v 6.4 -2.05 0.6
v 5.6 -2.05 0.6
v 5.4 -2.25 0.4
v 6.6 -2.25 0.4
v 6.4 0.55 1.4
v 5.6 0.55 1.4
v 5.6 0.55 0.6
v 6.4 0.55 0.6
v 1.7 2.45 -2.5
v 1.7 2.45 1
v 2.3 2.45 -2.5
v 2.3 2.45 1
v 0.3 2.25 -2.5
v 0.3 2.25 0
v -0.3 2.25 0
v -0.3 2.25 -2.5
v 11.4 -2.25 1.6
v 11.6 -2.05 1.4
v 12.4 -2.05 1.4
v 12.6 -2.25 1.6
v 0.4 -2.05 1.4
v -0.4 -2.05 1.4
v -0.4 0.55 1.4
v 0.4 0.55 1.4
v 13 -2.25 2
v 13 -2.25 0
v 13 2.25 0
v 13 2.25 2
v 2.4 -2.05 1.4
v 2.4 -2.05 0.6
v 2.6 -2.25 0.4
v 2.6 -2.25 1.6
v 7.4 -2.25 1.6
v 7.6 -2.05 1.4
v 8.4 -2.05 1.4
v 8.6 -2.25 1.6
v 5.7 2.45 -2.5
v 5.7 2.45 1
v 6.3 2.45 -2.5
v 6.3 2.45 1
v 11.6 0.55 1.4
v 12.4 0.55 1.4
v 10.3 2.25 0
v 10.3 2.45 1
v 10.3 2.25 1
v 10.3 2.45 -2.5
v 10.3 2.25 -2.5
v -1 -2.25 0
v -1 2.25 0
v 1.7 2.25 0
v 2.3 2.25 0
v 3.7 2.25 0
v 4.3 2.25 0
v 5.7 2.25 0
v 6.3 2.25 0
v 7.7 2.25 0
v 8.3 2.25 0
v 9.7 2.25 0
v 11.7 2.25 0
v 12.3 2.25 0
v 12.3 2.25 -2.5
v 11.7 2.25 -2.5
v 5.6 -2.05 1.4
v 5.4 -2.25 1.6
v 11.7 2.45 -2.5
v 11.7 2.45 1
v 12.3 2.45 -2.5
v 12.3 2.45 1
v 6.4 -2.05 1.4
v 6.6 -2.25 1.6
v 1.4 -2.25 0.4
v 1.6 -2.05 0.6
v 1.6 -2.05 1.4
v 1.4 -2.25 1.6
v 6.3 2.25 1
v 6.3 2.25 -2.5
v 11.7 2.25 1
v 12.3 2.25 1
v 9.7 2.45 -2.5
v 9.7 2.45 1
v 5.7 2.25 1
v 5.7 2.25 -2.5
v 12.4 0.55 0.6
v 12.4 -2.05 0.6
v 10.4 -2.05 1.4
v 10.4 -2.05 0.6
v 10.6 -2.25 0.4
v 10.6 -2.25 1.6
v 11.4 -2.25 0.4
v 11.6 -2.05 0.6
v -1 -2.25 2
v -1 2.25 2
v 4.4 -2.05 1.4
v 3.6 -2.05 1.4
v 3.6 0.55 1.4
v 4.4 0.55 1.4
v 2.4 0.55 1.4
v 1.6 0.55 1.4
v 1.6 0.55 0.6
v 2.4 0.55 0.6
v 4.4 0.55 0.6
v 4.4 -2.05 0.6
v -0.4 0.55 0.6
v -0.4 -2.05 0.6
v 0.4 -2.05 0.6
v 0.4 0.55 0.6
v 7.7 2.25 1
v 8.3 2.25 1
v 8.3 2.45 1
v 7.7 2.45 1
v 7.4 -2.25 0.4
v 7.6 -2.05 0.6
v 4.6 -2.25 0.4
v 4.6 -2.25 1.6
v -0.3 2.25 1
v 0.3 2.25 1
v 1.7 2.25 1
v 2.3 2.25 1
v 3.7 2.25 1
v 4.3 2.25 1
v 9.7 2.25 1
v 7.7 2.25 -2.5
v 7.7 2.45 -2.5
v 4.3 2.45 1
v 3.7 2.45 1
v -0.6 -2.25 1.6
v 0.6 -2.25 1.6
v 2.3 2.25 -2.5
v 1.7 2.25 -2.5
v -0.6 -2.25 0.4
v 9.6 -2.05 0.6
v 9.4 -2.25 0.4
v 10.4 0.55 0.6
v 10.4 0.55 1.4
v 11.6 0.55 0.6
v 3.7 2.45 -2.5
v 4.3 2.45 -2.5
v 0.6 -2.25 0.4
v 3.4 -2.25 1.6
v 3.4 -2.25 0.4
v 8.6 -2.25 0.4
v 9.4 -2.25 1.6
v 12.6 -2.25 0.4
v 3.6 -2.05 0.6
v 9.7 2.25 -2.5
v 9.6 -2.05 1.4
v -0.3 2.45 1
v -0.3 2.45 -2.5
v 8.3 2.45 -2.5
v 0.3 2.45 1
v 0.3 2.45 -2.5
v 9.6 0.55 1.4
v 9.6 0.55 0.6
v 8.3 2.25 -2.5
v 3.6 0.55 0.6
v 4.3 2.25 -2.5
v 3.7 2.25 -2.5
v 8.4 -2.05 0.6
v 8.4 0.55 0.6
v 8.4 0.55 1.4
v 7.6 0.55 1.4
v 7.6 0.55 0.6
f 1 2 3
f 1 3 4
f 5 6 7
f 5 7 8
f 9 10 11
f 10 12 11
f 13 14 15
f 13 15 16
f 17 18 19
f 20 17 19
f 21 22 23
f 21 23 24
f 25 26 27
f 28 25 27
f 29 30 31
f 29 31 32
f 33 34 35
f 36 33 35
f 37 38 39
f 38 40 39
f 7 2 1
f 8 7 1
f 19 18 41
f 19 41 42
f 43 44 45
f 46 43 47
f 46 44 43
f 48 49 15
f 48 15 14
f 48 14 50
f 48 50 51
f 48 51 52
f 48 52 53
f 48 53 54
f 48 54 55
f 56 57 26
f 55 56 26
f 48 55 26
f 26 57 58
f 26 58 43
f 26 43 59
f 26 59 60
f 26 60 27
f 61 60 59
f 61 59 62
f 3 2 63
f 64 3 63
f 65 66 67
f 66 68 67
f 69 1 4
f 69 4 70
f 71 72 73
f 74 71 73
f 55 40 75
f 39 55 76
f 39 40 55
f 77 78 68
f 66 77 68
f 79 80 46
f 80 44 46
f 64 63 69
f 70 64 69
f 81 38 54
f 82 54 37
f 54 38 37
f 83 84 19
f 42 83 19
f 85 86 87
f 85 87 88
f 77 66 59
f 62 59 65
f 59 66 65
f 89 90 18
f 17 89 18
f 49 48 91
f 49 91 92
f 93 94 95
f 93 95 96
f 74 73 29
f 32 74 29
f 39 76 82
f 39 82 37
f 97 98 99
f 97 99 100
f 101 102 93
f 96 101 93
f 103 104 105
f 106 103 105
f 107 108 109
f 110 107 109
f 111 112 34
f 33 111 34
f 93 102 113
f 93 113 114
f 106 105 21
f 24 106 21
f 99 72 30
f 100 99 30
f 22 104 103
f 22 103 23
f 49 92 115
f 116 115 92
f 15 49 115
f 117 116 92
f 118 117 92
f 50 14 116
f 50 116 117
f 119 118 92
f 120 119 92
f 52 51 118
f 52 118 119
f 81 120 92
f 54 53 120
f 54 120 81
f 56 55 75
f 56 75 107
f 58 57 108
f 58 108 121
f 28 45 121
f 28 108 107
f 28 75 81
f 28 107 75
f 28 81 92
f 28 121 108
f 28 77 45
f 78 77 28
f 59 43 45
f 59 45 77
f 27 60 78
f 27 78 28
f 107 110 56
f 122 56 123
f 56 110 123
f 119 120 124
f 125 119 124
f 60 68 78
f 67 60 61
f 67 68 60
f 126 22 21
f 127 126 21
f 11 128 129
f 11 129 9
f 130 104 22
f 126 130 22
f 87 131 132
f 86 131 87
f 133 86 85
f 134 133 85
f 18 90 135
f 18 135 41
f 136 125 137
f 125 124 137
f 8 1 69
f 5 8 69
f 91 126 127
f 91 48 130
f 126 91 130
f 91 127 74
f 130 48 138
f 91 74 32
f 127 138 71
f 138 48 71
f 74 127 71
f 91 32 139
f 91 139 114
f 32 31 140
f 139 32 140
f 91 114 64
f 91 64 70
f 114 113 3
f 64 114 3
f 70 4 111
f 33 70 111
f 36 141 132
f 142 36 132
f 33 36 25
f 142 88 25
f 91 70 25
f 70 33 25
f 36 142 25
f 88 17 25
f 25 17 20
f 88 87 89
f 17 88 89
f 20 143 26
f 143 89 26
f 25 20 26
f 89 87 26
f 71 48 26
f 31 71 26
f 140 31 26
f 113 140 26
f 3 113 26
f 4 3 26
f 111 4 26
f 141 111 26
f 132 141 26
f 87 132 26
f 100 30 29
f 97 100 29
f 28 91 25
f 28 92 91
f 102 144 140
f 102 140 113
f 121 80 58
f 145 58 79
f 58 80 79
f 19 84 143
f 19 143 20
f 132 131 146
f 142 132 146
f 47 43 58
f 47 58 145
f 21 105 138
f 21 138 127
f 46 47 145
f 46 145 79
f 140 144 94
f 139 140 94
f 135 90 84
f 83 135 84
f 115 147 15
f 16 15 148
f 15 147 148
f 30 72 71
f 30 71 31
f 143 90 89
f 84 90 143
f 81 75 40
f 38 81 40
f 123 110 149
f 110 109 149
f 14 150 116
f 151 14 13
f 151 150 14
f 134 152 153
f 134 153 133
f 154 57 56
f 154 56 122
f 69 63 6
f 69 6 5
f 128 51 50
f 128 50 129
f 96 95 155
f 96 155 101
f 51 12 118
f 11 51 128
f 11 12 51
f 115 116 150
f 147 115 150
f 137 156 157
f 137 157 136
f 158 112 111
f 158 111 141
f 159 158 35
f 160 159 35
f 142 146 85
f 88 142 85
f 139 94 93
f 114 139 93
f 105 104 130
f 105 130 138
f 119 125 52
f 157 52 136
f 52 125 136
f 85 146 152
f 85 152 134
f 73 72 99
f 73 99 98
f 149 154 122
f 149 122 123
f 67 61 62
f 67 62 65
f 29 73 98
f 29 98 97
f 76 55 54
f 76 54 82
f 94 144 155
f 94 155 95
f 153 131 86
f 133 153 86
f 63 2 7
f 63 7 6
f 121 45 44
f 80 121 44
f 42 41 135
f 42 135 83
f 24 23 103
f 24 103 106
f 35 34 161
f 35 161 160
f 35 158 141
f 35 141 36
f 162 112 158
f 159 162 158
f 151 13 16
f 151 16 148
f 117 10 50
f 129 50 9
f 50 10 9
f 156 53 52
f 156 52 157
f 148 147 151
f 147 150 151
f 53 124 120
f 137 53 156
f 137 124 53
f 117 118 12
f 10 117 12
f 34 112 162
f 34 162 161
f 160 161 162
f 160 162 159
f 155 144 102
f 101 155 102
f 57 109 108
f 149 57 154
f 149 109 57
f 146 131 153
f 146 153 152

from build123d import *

# Parameters (mm, degrees)
SKETCH1_W                  = 2
SKETCH1_H                  = 4.5
BOSS_EXTRUDE1_DEPTH        = 2
SKETCH2_W                  = 0.8
SKETCH2_H                  = 0.8
CUT_EXTRUDE1_DEPTH         = 2.8
CHAMFER1_SIZE              = 0.2
SKETCH3_W                  = 3.5
SKETCH3_H                  = 0.2
BOSS_EXTRUDE2_DEPTH        = 0.3
LPATTERN1_COUNT            = 7
LPATTERN1_PITCH            = 2
CHAMFER1_OF_LPATTERN1_SIZE = 0.2


with BuildPart() as part:
    # Sketch1 → Boss-Extrude1 (new body)
    with BuildSketch(Plane.XY):
        Rectangle(SKETCH1_W, SKETCH1_H)
    boss_extrude1 = extrude(amount=BOSS_EXTRUDE1_DEPTH)

    # Sketch2 → Cut-Extrude1 (cut)
    with BuildSketch(Plane.XZ.offset(2.25)):
        with Locations((0, 1)):
            Rectangle(SKETCH2_W, SKETCH2_H)
    cut_extrude1 = extrude(amount=-CUT_EXTRUDE1_DEPTH, mode=Mode.SUBTRACT)

    # Chamfer1
    chamfer1_edges = [part.edges().sort_by_distance(p)[0] for p in [
        (0.4, -2.25, 1),
        (0, -2.25, 1.4),
        (-0.4, -2.25, 1),
        (0, -2.25, 0.6),
    ]]
    chamfer(chamfer1_edges, length=CHAMFER1_SIZE)

    # Sketch3 → Boss-Extrude2 (add, symmetric)
    with BuildSketch(Plane(origin=(0, 0, 0), x_dir=(0, 0, -1), z_dir=(1, 0, 0))):
        with Locations((0.75, 2.35)):
            Rectangle(SKETCH3_W, SKETCH3_H)
    boss_extrude2 = extrude(amount=BOSS_EXTRUDE2_DEPTH, both=True)

    # LPattern1: Boss-Extrude1, Cut-Extrude1, Boss-Extrude2 ×7
    with Locations(*[(i * LPATTERN1_PITCH, 0, 0) for i in range(1, LPATTERN1_COUNT)]):
        add(boss_extrude1)
        add(cut_extrude1, mode=Mode.SUBTRACT)
        add(boss_extrude2)

    # Chamfer1 of LPattern1
    chamfer1_of_lpattern1_edges = [part.edges().sort_by_distance(p)[0] for p in [
        (2.4, -2.25, 1),
        (2, -2.25, 1.4),
        (1.6, -2.25, 1),
        (2, -2.25, 0.6),
        (4.4, -2.25, 1),
        (4, -2.25, 1.4),
        (3.6, -2.25, 1),
        (4, -2.25, 0.6),
        (6.4, -2.25, 1),
        (6, -2.25, 1.4),
        (5.6, -2.25, 1),
        (6, -2.25, 0.6),
        (8.4, -2.25, 1),
        (8, -2.25, 1.4),
        (7.6, -2.25, 1),
        (8, -2.25, 0.6),
        (10.4, -2.25, 1),
        (10, -2.25, 1.4),
        (9.6, -2.25, 1),
        (10, -2.25, 0.6),
        (12.4, -2.25, 1),
        (12, -2.25, 1.4),
        (11.6, -2.25, 1),
        (12, -2.25, 0.6),
    ]]
    chamfer(chamfer1_of_lpattern1_edges, length=CHAMFER1_OF_LPATTERN1_SIZE)


solid = part.part
